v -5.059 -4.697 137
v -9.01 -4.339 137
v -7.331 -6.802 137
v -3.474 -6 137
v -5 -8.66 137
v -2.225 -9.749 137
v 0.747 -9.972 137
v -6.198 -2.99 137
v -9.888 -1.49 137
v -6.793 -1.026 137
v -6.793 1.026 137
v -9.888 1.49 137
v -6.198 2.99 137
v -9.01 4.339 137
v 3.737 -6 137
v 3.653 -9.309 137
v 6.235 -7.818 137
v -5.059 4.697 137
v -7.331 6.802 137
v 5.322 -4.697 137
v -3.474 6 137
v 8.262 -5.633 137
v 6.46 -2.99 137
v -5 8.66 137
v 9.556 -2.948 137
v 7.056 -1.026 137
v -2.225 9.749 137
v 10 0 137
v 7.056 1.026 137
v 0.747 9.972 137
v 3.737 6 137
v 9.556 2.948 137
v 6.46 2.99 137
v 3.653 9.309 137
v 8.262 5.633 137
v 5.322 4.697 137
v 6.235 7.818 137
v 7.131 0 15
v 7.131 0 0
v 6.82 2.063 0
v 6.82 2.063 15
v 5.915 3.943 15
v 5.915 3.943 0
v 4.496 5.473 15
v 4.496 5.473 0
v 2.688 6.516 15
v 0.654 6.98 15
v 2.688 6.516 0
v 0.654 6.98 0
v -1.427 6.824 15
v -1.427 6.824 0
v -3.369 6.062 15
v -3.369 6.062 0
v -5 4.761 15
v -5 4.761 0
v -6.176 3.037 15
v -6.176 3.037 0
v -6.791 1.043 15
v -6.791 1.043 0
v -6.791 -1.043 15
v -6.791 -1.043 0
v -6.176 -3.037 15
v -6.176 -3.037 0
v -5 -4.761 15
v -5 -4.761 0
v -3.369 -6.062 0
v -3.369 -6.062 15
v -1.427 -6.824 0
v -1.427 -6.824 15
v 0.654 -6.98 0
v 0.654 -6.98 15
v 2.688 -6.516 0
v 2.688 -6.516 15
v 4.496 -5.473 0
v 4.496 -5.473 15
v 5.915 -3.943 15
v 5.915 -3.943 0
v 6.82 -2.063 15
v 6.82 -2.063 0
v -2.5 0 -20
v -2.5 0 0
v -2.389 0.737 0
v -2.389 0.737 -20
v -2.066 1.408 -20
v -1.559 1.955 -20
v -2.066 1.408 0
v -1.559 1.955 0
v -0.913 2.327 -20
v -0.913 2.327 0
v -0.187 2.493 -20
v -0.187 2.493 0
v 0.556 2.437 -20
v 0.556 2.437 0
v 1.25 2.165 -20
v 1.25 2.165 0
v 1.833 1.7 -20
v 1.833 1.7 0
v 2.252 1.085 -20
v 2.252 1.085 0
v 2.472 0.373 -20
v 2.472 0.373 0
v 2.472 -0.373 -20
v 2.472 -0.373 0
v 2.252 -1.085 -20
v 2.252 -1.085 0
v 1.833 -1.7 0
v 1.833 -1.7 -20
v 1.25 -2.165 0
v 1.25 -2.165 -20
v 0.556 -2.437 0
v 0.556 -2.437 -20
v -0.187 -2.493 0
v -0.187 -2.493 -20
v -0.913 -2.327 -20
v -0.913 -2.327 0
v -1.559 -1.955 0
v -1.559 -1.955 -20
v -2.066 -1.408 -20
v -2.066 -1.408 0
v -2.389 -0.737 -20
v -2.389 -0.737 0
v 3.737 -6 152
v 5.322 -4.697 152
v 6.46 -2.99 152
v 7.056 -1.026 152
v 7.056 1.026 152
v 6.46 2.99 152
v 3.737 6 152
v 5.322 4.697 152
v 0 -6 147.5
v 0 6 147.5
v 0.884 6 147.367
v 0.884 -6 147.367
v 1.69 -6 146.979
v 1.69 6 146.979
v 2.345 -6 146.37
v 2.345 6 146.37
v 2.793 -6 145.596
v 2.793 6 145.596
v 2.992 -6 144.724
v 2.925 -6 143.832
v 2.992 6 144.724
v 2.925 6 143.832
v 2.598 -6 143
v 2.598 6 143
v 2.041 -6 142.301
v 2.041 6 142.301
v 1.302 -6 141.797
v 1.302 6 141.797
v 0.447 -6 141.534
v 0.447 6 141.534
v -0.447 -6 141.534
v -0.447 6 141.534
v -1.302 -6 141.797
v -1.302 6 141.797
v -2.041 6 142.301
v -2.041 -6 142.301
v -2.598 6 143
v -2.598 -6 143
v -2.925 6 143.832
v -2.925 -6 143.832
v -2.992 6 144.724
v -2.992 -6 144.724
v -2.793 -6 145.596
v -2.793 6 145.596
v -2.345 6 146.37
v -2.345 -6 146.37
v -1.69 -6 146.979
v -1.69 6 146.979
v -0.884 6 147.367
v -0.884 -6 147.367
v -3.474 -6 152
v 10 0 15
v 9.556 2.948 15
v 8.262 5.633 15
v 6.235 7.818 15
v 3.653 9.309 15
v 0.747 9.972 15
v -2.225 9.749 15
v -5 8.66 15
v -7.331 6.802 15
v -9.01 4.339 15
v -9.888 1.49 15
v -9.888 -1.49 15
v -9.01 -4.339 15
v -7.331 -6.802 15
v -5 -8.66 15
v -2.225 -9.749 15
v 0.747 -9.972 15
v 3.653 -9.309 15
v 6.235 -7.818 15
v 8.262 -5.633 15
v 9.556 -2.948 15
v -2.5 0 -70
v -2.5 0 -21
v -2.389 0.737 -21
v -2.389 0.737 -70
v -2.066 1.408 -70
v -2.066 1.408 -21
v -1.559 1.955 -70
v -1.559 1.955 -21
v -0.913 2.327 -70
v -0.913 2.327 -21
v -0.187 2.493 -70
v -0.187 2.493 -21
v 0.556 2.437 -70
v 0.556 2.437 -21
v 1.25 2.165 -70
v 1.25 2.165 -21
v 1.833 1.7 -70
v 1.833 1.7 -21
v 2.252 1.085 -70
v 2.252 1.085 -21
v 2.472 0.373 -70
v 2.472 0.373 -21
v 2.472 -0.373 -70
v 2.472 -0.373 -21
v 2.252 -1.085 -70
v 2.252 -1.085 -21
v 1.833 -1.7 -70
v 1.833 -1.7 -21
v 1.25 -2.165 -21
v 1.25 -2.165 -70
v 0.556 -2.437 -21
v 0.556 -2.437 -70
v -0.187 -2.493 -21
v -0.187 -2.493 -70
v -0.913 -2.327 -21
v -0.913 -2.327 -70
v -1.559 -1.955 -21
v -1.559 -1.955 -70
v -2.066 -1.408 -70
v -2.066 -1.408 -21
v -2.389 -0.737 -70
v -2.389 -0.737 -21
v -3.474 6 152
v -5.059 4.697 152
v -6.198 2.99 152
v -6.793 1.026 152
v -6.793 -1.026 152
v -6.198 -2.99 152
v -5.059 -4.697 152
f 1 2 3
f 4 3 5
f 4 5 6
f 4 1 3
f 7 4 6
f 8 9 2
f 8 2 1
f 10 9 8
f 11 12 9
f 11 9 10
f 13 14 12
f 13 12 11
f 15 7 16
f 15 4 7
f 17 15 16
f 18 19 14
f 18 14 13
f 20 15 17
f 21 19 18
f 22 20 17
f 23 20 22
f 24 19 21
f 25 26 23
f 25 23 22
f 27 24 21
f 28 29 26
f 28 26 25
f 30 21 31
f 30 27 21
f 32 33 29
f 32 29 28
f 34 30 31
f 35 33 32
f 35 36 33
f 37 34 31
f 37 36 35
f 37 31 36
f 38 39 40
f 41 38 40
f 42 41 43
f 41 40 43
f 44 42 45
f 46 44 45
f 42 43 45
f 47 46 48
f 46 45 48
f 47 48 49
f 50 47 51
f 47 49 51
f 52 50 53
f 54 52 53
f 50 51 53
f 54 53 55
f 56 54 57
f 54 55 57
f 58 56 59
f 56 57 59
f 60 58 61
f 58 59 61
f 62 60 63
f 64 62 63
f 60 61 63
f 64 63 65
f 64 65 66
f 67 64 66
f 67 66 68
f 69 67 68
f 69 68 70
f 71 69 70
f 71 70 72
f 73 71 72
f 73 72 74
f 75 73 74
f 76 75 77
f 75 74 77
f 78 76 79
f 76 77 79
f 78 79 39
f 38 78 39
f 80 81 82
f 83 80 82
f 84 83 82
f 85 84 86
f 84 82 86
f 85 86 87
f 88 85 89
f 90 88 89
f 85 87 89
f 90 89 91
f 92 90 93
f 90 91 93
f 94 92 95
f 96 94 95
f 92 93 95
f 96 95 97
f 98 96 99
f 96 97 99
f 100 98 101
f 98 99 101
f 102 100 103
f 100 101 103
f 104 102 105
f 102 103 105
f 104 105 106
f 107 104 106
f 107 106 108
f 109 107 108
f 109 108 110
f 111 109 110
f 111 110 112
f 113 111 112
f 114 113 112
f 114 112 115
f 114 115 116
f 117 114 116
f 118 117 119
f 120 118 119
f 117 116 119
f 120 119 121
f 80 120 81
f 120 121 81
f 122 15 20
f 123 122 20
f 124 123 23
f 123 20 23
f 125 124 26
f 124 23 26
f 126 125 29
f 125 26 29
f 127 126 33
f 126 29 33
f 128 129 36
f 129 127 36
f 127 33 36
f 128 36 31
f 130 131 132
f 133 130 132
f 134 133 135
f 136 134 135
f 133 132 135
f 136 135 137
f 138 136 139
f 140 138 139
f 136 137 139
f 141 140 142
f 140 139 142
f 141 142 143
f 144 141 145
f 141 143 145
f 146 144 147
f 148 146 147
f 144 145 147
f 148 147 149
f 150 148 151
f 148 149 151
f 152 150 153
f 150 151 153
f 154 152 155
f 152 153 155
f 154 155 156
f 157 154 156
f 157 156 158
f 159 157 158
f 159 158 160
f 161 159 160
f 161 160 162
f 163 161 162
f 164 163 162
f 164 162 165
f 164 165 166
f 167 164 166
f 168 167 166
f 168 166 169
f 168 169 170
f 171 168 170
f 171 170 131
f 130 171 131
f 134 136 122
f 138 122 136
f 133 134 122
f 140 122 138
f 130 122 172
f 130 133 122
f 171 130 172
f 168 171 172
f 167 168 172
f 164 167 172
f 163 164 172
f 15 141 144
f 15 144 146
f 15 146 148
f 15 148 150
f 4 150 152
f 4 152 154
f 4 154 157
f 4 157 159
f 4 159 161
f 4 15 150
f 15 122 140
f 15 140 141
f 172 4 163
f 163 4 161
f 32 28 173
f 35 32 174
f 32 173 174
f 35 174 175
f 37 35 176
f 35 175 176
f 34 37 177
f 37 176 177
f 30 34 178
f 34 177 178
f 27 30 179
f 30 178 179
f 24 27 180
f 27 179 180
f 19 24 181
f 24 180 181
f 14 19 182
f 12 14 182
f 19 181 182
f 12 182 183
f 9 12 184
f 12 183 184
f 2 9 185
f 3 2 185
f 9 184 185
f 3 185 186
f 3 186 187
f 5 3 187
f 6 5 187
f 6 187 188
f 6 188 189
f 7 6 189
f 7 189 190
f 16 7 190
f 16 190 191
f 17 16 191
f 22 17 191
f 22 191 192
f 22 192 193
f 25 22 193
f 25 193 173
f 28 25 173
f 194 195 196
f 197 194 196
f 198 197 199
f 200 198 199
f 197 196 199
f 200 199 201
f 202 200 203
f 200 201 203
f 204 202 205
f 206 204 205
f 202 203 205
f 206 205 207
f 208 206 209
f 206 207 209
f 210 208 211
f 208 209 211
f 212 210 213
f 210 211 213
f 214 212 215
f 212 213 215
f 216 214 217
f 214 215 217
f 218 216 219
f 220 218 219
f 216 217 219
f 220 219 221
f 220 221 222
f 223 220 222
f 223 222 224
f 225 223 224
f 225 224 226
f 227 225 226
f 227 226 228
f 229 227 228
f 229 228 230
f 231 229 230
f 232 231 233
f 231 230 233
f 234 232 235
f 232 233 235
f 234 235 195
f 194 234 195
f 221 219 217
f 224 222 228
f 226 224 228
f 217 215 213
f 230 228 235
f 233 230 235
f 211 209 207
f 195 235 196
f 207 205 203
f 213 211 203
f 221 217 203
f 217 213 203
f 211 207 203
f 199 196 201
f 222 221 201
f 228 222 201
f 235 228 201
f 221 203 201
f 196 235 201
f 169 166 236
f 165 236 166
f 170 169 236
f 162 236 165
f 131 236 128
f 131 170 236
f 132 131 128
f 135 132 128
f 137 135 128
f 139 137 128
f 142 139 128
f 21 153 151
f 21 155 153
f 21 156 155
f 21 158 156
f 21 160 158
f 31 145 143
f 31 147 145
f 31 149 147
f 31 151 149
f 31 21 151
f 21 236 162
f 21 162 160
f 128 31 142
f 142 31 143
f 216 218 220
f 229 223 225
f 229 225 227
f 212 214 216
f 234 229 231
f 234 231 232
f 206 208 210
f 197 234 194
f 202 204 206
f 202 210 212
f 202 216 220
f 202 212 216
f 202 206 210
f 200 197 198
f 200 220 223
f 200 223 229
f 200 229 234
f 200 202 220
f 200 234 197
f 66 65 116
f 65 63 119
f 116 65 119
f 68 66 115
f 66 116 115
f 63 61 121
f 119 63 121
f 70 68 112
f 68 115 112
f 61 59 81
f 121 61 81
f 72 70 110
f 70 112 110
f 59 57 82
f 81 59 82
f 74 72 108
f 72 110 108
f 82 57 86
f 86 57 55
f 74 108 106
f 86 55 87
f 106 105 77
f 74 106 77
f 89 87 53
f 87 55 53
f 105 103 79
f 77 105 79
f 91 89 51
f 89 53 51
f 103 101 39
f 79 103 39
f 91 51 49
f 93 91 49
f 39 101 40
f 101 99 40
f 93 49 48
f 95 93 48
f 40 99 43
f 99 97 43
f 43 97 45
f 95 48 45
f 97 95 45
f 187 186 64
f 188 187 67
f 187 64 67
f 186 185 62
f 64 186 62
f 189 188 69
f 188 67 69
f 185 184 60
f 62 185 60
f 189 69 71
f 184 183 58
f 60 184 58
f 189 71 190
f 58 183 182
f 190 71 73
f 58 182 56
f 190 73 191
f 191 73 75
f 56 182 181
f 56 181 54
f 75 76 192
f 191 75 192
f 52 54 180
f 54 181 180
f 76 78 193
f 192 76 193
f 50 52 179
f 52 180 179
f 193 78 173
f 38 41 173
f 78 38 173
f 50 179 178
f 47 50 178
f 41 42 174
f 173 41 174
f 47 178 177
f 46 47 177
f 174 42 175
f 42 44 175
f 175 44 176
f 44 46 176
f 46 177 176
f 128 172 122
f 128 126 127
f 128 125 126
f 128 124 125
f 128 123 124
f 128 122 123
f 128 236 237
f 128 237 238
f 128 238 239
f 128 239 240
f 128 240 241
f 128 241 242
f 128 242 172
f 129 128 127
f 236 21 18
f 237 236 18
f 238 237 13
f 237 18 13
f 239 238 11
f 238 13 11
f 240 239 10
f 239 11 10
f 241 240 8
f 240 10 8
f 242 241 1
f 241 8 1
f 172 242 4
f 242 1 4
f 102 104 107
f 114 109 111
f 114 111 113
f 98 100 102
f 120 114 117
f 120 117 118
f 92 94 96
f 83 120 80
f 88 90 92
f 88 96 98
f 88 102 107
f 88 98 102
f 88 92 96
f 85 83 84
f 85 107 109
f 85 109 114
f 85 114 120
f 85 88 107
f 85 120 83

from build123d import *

# Parameters (mm, degrees)
SKETCH_1_R          = 10
EXTRUDE_1_DEPTH     = 152
CUT_EXTRUDE_START   = -15
SKETCH_2_R          = 10
SKETCH_2_R_2        = 7
CUT_EXTRUDE_1_DEPTH = 15
CUT_EXTRUDE_START_2 = -152
SKETCH_2_3_R        = 10
SKETCH_2_3_R_2      = 7
CUT_EXTRUDE_2_DEPTH = 15
SKETCH_3_R          = 3
CUT_EXTRUDE_3_DEPTH = 154.166575988
SKETCH_4_R          = 2.5
EXTRUDE_2_DEPTH     = 20
EXTRUDE_START       = 21
SKETCH_4_2_R        = 2.5
EXTRUDE_3_DEPTH     = 49


with BuildPart() as part:
    # 草图1 → 凸台-拉伸1 (new body)
    with BuildSketch(Plane.XY):
        Circle(SKETCH_1_R)
    extrude(amount=EXTRUDE_1_DEPTH)

    # 草图2 → 切除-拉伸1 (cut)
    # profile 1 of 3: a face of its own
    with BuildSketch(Plane.XY.offset(152).offset(CUT_EXTRUDE_START)):
        Circle(SKETCH_2_R)
        with Locations((0.131100685, 0)):
            Circle(SKETCH_2_R_2, mode=Mode.SUBTRACT)
    # profile 2 of 3: a face of its own
    with BuildSketch(Plane.XY.offset(152).offset(CUT_EXTRUDE_START)):
        with BuildLine():
            Line((3.73665196, -6), (-3.47445059, -6))
            ThreePointArc((-3.47445059, -6), (0.131100685, -7), (3.73665196, -6))
        make_face()
    # profile 3 of 3: a face of its own
    with BuildSketch(Plane.XY.offset(152).offset(CUT_EXTRUDE_START)):
        with BuildLine():
            ThreePointArc((3.73665196, 6), (0.131100685, 7), (-3.47445059, 6))
            Line((-3.47445059, 6), (3.73665196, 6))
        make_face()
    extrude(amount=CUT_EXTRUDE_1_DEPTH, mode=Mode.SUBTRACT)

    # 草图2<3> → 切除-拉伸2 (cut)
    with BuildSketch(Plane.XY.offset(152).offset(CUT_EXTRUDE_START_2)):
        Circle(SKETCH_2_3_R)
        with Locations((0.131100685, 0)):
            Circle(SKETCH_2_3_R_2, mode=Mode.SUBTRACT)
    extrude(amount=CUT_EXTRUDE_2_DEPTH, mode=Mode.SUBTRACT)

    # 草图3 → 切除-拉伸3 (cut, through all)
    with BuildSketch(Plane(origin=(0, 6, 0), x_dir=(1, 0, 0), z_dir=(0, 1, 0))):
        with Locations(Location((0, -144.5, 0), (0, 0, 270))):
            Circle(SKETCH_3_R)
    extrude(amount=-CUT_EXTRUDE_3_DEPTH, mode=Mode.SUBTRACT)

    # 草图4 → 凸台-拉伸2 (add)
    with BuildSketch(Plane(origin=(0, 0, 0), x_dir=(-1, 0, 0), z_dir=(0, 0, -1))):
        Circle(SKETCH_4_R)
    extrude(amount=EXTRUDE_2_DEPTH)


with BuildPart() as body_2:
    # 草图4<2> → 凸台-拉伸3 (new body)
    with BuildSketch(Plane(origin=(0, 0, 0), x_dir=(-1, 0, 0), z_dir=(0, 0, -1)).offset(EXTRUDE_START)):
        Circle(SKETCH_4_2_R)
    extrude(amount=EXTRUDE_3_DEPTH)


solid = Compound([part.part, body_2.part])
